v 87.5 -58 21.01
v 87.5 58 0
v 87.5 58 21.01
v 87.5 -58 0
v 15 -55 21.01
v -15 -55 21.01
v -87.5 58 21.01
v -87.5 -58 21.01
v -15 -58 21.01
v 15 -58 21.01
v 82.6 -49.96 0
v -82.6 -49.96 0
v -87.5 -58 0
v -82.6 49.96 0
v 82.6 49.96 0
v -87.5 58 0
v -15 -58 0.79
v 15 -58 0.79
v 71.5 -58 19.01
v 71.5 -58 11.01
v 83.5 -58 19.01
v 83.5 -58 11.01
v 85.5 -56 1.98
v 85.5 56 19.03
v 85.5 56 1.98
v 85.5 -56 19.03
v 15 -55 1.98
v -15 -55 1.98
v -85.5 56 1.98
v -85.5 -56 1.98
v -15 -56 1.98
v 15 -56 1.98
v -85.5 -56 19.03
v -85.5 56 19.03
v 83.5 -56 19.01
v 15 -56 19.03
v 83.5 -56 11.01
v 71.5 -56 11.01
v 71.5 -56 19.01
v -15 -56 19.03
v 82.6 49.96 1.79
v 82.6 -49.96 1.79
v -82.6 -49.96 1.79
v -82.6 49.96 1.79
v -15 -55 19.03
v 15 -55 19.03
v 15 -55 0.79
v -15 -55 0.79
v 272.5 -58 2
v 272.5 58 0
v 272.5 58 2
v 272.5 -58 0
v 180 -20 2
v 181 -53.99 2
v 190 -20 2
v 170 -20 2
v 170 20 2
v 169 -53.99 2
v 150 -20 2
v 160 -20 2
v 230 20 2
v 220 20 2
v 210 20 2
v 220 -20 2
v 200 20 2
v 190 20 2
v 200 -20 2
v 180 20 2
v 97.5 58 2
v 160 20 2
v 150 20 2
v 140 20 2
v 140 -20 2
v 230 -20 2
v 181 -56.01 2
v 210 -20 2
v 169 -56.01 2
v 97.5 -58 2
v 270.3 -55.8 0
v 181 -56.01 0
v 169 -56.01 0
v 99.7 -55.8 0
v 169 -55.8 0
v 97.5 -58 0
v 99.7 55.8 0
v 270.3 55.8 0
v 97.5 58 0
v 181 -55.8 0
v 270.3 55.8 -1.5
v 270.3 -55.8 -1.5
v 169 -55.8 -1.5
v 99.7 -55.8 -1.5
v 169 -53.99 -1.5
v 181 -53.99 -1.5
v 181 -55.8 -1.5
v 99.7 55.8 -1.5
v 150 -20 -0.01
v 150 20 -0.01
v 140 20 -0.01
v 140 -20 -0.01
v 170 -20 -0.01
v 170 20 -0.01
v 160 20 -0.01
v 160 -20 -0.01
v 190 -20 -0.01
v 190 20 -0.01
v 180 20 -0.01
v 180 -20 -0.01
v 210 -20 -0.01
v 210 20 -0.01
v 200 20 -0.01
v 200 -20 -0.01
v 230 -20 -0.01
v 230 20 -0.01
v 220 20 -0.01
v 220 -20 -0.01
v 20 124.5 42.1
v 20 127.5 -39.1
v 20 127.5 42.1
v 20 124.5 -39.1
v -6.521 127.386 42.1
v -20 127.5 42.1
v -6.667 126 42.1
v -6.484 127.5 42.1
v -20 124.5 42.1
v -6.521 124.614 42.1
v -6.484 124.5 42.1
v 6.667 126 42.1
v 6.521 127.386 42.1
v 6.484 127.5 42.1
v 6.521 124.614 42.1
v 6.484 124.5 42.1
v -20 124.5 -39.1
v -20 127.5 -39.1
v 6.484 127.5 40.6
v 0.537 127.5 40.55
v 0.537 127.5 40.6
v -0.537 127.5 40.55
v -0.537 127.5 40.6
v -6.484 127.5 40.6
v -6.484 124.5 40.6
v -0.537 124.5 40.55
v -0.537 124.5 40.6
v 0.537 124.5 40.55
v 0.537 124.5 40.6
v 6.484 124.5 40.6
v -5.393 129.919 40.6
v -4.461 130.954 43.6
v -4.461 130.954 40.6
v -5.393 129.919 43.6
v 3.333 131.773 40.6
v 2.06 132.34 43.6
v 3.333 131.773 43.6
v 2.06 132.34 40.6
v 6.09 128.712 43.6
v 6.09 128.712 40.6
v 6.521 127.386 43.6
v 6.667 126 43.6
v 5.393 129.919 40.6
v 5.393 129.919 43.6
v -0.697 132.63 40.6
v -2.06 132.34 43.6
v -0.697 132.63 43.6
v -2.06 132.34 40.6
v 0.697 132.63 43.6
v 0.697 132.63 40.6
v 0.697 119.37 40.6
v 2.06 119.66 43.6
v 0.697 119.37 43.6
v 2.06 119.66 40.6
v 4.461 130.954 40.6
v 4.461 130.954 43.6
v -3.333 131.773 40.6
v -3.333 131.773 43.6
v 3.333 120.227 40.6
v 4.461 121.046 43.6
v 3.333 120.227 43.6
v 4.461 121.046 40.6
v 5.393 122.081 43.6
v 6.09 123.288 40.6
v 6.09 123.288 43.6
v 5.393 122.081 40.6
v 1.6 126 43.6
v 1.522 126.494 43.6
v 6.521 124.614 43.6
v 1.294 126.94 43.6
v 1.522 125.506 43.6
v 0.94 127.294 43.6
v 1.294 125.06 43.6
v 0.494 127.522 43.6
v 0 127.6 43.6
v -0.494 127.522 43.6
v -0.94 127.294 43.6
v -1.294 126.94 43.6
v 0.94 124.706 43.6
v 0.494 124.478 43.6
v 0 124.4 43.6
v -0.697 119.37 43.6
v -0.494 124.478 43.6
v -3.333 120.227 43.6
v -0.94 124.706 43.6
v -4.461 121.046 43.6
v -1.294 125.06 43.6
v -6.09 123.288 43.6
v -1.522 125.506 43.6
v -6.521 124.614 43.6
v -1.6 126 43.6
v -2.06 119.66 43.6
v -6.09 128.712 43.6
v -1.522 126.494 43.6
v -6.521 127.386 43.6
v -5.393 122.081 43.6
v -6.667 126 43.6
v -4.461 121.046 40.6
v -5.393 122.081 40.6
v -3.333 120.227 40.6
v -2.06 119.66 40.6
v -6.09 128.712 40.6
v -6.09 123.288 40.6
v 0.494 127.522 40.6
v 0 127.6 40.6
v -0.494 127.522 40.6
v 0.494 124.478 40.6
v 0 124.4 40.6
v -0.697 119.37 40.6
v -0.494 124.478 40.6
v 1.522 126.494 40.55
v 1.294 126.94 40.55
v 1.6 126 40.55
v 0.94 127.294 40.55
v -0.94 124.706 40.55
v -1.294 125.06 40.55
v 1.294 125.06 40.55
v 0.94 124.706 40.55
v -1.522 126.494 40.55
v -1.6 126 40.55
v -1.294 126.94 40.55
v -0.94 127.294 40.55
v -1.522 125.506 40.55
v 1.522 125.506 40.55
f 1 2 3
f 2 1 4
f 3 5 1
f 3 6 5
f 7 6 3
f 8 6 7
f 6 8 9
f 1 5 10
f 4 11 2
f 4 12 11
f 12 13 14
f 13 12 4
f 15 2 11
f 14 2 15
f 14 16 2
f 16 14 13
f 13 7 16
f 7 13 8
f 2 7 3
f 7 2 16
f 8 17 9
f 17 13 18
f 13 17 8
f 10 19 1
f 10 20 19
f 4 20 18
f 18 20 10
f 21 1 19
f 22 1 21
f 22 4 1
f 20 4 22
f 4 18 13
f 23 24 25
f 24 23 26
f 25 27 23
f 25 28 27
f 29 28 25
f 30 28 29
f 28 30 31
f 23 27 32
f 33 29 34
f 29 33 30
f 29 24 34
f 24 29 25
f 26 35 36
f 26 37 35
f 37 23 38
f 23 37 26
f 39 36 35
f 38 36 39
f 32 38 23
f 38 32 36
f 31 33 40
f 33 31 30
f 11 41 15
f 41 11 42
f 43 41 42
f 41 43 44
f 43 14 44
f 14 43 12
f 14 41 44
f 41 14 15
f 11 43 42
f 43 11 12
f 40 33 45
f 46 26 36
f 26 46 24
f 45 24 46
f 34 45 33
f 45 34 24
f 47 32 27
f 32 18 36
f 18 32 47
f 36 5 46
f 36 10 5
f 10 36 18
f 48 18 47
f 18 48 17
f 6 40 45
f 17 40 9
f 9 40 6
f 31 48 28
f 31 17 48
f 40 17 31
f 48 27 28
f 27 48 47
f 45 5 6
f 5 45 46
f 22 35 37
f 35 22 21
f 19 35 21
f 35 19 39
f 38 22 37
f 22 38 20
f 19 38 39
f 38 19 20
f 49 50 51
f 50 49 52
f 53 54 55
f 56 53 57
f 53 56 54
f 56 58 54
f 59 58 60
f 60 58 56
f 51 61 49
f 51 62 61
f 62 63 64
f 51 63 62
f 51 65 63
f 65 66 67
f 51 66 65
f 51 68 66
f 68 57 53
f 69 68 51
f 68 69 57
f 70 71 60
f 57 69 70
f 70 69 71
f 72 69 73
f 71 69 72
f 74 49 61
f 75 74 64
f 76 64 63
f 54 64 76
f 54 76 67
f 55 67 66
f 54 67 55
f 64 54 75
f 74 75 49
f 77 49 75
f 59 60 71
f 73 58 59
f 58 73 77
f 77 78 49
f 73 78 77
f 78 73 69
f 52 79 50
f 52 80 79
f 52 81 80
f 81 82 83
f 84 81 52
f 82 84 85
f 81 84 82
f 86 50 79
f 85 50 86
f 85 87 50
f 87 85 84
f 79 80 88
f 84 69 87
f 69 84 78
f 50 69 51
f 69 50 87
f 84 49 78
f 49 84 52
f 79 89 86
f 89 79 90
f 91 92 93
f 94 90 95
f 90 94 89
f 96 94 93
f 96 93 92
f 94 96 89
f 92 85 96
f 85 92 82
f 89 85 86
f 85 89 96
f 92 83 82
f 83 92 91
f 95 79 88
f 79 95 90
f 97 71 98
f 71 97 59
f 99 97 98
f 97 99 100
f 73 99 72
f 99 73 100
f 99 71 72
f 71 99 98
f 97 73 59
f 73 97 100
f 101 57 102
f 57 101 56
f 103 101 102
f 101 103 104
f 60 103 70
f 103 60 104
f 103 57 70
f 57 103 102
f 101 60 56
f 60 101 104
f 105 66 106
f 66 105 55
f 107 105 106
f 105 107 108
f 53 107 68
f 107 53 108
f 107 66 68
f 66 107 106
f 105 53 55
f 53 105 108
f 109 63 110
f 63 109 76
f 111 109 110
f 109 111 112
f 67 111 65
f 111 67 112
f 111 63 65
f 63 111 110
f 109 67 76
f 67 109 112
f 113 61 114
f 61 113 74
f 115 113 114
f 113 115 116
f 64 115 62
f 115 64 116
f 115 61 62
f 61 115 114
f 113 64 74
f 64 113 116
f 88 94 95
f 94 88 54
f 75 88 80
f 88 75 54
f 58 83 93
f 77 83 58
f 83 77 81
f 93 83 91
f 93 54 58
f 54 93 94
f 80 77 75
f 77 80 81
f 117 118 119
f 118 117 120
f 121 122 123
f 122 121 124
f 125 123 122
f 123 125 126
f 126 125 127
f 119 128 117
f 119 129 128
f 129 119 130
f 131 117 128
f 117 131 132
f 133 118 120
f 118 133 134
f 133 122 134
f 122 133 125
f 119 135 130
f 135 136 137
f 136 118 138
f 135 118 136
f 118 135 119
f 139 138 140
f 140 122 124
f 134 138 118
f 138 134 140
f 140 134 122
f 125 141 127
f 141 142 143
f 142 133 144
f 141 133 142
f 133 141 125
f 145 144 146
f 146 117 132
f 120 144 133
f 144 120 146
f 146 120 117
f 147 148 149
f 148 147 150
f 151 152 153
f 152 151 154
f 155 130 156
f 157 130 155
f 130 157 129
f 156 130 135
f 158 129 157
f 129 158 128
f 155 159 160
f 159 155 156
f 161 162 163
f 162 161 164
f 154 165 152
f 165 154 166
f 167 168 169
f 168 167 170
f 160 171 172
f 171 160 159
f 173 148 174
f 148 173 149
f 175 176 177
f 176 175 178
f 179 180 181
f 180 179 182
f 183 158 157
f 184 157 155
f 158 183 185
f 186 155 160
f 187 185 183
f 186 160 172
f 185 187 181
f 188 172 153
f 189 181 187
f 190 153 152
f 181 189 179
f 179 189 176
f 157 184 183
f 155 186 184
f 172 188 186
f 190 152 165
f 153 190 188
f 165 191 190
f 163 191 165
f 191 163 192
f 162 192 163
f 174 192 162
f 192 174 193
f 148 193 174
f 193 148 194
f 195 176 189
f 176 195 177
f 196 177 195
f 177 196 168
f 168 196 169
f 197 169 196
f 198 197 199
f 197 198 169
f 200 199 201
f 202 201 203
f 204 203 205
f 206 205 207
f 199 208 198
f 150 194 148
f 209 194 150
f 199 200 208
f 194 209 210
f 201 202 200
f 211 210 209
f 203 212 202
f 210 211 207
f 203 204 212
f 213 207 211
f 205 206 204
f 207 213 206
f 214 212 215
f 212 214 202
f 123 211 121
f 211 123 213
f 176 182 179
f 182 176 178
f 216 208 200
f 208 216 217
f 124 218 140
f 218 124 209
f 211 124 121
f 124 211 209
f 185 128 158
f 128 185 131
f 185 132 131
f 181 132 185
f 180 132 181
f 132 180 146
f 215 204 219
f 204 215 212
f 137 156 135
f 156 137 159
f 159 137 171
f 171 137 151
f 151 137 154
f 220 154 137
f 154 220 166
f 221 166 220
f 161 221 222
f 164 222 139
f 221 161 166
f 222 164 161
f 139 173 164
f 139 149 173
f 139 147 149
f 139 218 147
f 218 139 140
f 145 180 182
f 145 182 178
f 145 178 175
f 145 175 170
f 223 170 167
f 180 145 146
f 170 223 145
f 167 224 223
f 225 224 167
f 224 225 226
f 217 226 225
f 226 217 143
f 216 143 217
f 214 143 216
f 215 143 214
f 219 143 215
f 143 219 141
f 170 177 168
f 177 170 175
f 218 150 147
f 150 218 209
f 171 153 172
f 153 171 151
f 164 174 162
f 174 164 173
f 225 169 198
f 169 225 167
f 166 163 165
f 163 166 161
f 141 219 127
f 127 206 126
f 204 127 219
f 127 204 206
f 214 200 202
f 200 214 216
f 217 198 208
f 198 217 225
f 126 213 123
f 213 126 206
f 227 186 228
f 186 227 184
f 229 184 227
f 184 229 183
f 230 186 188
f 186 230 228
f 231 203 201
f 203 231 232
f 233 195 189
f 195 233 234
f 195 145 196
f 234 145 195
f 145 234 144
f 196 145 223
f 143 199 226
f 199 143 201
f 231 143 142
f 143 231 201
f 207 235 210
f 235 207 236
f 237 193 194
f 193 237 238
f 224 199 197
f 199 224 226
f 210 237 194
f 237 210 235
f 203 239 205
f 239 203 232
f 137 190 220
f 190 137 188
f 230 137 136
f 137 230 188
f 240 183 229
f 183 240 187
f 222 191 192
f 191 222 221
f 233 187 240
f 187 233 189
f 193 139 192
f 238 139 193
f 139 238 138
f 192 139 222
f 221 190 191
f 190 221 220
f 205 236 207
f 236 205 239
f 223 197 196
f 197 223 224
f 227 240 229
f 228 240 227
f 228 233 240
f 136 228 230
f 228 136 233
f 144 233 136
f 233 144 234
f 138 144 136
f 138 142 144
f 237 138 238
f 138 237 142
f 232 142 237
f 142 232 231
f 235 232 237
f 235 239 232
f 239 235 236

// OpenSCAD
// display-frame.scad
// Freestanding frame for Waveshare 7.5" V2 e-ink display
// with ESP32 driver board and LiPo battery enclosed behind.

// ── Display panel ───────────────────────────────────────
disp_w = 170.2;       // mm, horizontal
disp_h = 111.2;       // mm, vertical
disp_t = 1.18;        // mm, thickness
active_w = 163.2;     // mm, visible area width
active_h = 97.92;     // mm, visible area height

// ── Driver board ────────────────────────────────────────
pcb_w = 48.25;        // mm
pcb_h = 29.46;        // mm
pcb_t = 1.6;          // mm (standard PCB)

// ── Battery ─────────────────────────────────────────────
bat_w = 51.36;        // mm
bat_h = 51.36;        // mm
bat_t = 9.83;         // mm

// ── Frame parameters ────────────────────────────────────
wall = 2.0;           // mm, wall thickness
bezel = 3.5;          // mm, front bezel overlap around display
tol = 0.4;            // mm, tolerance/clearance per side
back_depth = bat_t + pcb_t + 4;  // mm, rear cavity depth (battery + board + clearance)

// ── Derived dimensions ──────────────────────────────────
// Outer shell
outer_w = disp_w + 2*tol + 2*wall;
outer_h = disp_h + 2*tol + 2*wall;
outer_d = wall + disp_t + tol + back_depth + wall;  // front wall + display + gap + cavity + back wall

// Display pocket (front, recessed into front face)
pocket_w = disp_w + 2*tol;
pocket_h = disp_h + 2*tol;
pocket_d = disp_t + tol;

// Front window (exposes active area)
win_w = active_w + 2;  // slight margin
win_h = active_h + 2;

// Ribbon cable slot — display ribbon exits bottom edge
ribbon_slot_w = 30;
ribbon_slot_h = 5;

// ── Kickstand ───────────────────────────────────────────
stand_angle = 15;     // degrees from vertical
stand_w = 40;
stand_t = 3;
stand_len = outer_h * 0.7;

// ── Main frame ──────────────────────────────────────────
module frame() {
    difference() {
        // Outer shell — rounded box
        translate([0, 0, outer_d/2])
            cube([outer_w, outer_h, outer_d], center=true);

        // Front display pocket (from front face)
        translate([0, 0, -0.01])
            translate([0, 0, wall + pocket_d/2])
                cube([pocket_w, pocket_h, pocket_d + 0.02], center=true);

        // Front window (through front wall, exposing active area)
        translate([0, 0, -0.01])
            cube([win_w, win_h, wall + 0.02 + pocket_d], center=true);

        // Rear cavity (from back, for driver board + battery)
        translate([0, 0, outer_d - wall - back_depth/2 + 0.01])
            cube([outer_w - 2*wall, outer_h - 2*wall, back_depth + 0.02], center=true);

        // Ribbon cable slot — bottom edge, connecting front pocket to rear cavity
        translate([0, -outer_h/2 + wall/2, wall + pocket_d + (outer_d - wall - pocket_d - wall)/2])
            cube([ribbon_slot_w, wall + 2, outer_d], center=true);

        // USB access hole — bottom edge, for charging
        translate([outer_w/2 - wall/2 - 15, -outer_h/2 - 0.01, outer_d - wall - 8])
            cube([12, wall + 0.02, 8]);
    }
}

// ── Back cover (snap-on or friction fit) ────────────────
module back_cover() {
    lip = 1.5;  // mm, lip that inserts into cavity

    translate([0, 0, 0]) {
        difference() {
            union() {
                // Flat cover plate
                cube([outer_w, outer_h, wall], center=true);
                // Lip to fit inside cavity
                translate([0, 0, -wall/2 - lip/2])
                    cube([outer_w - 2*wall - tol, outer_h - 2*wall - tol, lip], center=true);
            }

            // USB access hole matching frame
            translate([outer_w/2 - wall/2 - 15 - outer_w/2, -outer_h/2 + wall - outer_h/2 + outer_h/2 - 0.01, -wall/2 - lip - 0.01])
                cube([12, wall + 0.02, wall + lip + 0.02]);

            // Ventilation slots
            for (i = [-2:2]) {
                translate([i * 20, 0, 0])
                    cube([10, 40, wall + 0.02], center=true);
            }
        }
    }
}

// ── Kickstand ───────────────────────────────────────────
module kickstand() {
    difference() {
        union() {
            // Main strut
            cube([stand_w, stand_t, stand_len], center=true);
            // Hinge tab (top)
            translate([0, 0, stand_len/2])
                cylinder(h=stand_t, r=stand_w/6, center=true, $fn=30);
        }
        // Hinge hole
        translate([0, 0, stand_len/2])
            cylinder(h=stand_t + 0.1, r=1.6, center=true, $fn=20);
    }
}

// ── Assembly ────────────────────────────────────────────
// Uncomment the part you want to export:

// Main frame
frame();

// Back cover — offset for printing
translate([outer_w + 10, 0, wall/2])
    back_cover();

// Kickstand — offset for printing
translate([0, outer_h + 10, stand_t/2])
    kickstand();
